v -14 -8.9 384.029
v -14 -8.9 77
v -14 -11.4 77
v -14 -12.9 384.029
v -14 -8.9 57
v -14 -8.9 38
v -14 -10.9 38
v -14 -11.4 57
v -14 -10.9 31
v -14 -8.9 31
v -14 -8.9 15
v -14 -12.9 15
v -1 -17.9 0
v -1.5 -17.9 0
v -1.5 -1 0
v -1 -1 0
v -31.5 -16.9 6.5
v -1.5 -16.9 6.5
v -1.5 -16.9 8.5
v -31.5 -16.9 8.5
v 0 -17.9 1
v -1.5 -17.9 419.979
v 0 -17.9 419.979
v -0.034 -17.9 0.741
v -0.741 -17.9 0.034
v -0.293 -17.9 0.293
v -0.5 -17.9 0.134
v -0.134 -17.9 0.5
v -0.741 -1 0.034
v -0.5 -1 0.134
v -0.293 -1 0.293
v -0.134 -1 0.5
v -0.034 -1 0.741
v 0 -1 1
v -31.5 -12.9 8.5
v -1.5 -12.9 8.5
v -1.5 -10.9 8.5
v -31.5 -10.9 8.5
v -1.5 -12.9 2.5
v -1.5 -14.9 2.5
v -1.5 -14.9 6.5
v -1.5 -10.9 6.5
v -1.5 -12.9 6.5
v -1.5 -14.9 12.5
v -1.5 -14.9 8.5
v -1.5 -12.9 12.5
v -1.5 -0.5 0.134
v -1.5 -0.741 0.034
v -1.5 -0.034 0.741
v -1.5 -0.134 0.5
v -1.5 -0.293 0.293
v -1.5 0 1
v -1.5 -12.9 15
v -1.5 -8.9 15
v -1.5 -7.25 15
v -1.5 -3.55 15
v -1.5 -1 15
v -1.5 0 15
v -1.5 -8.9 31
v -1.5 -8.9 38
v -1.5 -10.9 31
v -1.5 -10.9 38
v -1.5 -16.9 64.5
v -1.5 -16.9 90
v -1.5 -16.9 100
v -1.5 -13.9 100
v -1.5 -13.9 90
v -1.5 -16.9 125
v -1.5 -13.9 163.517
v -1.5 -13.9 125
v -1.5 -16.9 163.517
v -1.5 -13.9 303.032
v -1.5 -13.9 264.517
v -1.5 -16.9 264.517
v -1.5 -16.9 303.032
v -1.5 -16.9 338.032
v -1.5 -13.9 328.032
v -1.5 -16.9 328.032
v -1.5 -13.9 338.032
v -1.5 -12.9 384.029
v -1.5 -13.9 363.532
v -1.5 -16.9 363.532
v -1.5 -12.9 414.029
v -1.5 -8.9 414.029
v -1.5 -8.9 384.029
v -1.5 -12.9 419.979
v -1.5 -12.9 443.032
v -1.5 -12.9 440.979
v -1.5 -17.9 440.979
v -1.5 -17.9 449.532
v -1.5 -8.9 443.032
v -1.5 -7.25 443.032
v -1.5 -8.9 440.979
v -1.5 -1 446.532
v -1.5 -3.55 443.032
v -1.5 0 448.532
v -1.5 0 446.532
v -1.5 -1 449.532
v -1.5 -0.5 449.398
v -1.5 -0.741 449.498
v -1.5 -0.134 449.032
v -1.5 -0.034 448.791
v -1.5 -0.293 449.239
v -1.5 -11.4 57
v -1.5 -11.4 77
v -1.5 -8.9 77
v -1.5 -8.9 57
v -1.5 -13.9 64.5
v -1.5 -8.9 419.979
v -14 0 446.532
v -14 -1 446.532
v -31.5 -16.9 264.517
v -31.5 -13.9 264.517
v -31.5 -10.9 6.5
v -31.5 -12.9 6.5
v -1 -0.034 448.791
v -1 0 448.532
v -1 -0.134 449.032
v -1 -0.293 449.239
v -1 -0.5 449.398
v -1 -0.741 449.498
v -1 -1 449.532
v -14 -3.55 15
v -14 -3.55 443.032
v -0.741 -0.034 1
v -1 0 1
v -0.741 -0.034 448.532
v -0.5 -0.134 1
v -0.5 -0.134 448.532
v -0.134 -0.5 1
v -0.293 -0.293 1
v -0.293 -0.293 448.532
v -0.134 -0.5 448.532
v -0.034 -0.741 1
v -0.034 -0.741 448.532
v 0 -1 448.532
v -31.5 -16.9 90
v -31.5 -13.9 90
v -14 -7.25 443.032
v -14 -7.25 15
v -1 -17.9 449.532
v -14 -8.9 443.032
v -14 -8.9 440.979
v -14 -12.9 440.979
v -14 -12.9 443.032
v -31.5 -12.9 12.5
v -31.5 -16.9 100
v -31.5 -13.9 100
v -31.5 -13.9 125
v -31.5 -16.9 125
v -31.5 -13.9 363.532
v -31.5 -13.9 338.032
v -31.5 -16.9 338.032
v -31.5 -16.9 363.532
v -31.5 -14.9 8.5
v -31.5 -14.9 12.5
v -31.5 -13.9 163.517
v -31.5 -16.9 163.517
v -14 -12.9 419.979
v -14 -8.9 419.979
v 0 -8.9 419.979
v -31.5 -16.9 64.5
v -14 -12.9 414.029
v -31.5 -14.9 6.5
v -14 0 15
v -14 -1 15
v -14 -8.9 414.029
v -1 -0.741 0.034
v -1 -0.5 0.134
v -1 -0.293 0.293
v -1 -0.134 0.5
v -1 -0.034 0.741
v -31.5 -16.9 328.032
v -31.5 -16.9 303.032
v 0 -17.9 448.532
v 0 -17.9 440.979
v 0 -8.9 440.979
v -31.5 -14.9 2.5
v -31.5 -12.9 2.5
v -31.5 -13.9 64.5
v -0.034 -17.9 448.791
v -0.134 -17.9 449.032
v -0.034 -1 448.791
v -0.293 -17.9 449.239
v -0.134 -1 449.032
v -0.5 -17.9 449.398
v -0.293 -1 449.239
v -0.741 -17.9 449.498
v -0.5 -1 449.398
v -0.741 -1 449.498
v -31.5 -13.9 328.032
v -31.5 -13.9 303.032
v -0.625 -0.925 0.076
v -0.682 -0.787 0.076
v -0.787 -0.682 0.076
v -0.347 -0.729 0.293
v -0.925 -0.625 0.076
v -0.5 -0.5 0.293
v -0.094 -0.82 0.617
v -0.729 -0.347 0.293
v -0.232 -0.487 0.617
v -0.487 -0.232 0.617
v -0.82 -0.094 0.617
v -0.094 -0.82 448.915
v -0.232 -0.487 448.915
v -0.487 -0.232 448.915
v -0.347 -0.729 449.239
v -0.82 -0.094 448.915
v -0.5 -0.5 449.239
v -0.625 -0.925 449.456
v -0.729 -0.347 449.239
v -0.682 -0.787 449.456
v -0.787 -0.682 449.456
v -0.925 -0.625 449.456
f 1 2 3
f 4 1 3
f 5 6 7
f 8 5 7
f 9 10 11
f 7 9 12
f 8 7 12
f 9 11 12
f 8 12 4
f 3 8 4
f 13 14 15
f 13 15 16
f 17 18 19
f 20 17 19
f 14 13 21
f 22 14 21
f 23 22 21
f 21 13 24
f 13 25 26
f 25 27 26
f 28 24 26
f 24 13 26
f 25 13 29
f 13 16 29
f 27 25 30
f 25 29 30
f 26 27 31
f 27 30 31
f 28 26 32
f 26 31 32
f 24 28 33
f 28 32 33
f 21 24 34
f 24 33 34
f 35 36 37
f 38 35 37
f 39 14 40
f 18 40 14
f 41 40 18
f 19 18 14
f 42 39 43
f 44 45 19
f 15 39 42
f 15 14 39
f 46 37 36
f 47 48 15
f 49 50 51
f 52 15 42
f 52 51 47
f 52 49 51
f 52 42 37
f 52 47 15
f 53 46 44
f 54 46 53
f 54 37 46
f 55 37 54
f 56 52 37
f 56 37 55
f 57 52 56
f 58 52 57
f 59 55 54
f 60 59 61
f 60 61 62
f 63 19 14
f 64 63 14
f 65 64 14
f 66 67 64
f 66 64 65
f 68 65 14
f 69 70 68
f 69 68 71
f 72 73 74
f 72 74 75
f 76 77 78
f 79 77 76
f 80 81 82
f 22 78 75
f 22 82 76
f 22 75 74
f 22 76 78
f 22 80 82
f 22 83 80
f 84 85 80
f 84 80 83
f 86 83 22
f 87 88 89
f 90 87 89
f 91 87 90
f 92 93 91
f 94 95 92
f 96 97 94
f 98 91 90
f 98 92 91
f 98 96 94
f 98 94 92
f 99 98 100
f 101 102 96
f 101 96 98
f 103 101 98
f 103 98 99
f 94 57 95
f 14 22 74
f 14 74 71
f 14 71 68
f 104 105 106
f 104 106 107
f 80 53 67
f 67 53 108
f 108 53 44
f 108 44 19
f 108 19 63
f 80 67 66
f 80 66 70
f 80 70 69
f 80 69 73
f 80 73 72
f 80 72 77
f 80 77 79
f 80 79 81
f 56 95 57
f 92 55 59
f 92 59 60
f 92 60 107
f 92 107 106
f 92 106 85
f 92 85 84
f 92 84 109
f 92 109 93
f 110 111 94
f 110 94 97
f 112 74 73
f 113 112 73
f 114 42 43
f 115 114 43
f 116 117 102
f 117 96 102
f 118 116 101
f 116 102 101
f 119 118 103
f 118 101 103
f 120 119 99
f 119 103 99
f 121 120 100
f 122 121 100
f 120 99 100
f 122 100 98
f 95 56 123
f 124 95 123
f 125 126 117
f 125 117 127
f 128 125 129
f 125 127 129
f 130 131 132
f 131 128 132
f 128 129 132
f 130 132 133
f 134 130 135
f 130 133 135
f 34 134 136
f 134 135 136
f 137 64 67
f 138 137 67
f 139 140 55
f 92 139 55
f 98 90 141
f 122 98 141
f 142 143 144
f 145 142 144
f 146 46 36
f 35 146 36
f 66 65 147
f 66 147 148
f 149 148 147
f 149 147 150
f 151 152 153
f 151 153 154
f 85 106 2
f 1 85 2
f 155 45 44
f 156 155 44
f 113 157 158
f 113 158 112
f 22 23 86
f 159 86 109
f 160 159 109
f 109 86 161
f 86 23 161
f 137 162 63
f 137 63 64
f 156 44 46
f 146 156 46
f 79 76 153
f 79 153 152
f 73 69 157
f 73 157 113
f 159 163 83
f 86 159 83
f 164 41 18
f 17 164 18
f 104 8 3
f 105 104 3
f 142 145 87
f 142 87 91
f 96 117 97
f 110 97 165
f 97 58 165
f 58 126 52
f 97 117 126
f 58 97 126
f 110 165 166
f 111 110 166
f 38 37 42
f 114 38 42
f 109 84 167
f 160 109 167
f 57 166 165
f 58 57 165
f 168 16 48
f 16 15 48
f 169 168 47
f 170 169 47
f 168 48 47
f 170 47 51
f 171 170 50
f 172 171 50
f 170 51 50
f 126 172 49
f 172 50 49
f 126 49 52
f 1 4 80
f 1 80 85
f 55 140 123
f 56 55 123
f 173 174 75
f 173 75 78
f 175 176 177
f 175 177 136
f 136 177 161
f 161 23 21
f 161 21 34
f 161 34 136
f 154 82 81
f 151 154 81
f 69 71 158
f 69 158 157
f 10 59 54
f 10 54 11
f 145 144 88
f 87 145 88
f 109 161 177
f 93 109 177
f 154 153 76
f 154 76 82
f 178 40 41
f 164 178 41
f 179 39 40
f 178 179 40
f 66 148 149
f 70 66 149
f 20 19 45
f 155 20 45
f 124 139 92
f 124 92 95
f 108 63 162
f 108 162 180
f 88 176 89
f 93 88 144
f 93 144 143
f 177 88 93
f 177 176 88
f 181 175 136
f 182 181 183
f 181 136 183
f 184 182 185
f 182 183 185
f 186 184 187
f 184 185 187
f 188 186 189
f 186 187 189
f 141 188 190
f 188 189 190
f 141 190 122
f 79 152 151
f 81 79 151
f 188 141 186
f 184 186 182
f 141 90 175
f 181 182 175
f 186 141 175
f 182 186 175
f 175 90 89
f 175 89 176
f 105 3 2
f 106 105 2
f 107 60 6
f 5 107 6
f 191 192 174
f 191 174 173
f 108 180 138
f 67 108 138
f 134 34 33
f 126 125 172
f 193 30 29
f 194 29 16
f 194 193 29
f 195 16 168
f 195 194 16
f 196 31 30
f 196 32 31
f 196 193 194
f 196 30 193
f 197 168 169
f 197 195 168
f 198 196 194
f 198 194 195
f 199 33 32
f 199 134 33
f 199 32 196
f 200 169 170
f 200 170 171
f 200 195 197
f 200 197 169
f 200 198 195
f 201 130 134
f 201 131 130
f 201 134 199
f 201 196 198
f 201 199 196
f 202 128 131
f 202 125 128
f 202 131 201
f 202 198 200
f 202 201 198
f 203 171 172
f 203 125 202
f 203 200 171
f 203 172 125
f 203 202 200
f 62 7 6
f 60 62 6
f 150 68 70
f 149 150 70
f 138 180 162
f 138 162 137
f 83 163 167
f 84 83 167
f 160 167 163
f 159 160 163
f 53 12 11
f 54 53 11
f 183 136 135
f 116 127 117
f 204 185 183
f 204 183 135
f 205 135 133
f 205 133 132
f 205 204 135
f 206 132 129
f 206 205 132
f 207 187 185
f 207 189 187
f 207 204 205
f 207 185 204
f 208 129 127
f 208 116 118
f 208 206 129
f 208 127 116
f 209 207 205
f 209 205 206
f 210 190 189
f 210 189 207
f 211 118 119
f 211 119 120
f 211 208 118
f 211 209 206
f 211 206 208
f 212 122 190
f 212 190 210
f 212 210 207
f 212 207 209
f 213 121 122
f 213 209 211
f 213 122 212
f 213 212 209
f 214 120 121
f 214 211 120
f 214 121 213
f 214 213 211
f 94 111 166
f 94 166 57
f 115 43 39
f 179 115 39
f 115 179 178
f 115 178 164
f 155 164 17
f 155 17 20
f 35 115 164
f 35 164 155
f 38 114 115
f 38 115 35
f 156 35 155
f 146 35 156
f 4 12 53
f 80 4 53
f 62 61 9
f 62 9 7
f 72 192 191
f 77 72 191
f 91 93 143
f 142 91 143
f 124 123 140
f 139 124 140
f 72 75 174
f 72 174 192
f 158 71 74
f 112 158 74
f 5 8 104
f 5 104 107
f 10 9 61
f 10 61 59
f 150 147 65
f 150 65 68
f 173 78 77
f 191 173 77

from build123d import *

# Parameters (mm, degrees)
EXTRUDE_1_DEPTH          = 449.532
SKETCH_7_W               = 15
SKETCH_7_H               = 12.9
CUT_EXTRUDE_2_DEPTH      = 12.5
CUT_EXTRUDE_3_DEPTH      = 12.5
SKETCH_10_W              = 25.5
SKETCH_10_H              = 3
SKETCH_10_W_2            = 101
SKETCH_10_W_3            = 25
EXTRUDE_6_DEPTH          = 30
CUT_EXTRUDE_4_DEPTH      = 30
CUT_EXTRUDE_4_DEPTH_BACK = 30
SKETCH_11_W              = 21
SKETCH_11_H              = 9
SKETCH_12_W              = 30
SKETCH_12_H              = 4
CUT_EXTRUDE_5_DEPTH      = 12.5
SKETCH_15_W              = 7
SKETCH_15_H              = 2
CUT_EXTRUDE_8_DEPTH      = 12.5
SKETCH_17_W              = 20
SKETCH_17_H              = 2.5
CUT_EXTRUDE_9_DEPTH      = 12.5
FILLET_2_R               = 1
FILLET_3_R               = 1
FILLET_4_R               = 1


with BuildPart() as part:
    # 草图1 → 凸台-拉伸1 (new body)
    with BuildSketch(Plane.XY):
        Polygon((0, 0), (-14, 0), (-14, -1), (-1.5, -1), (-1.5, -3.55), (-14, -3.55), (-14, -7.25), (-1.5, -7.25), (-1.5, -8.9), (-14, -8.9), (-14, -12.9), (-1.5, -12.9), (-1.5, -17.9), (0, -17.9), align=None)
    extrude(amount=EXTRUDE_1_DEPTH)

    # 草图7 → 切除-拉伸2 (cut)
    with BuildSketch(Plane.ZY.offset(14)):
        with Locations((7.5, -6.45)):
            Rectangle(SKETCH_7_W, SKETCH_7_H)
    extrude(amount=-CUT_EXTRUDE_2_DEPTH, mode=Mode.SUBTRACT)

    # 草图8 → 切除-拉伸3 (cut)
    with BuildSketch(Plane.ZY.offset(14)):
        Polygon((449.532, -12.9), (443.032, -12.9), (443.032, -1), (446.532, -1.000447275), (446.532, 0), (449.532, 0), align=None)
    extrude(amount=-CUT_EXTRUDE_3_DEPTH, mode=Mode.SUBTRACT)

    # 草图10 → 凸台-拉伸6 (add)
    with BuildSketch(Plane.ZY.offset(1.5)):
        Polygon((6.5, -14.9), (6.5, -16.9), (8.5, -16.9), (8.5, -14.9), (12.5, -14.9), (12.5, -12.9), (8.5, -12.9), (8.5, -10.9), (6.5, -10.9), (6.5, -12.9), (2.5, -12.9), (2.5, -14.9), align=None)
        with Locations((77.25, -15.4)):
            Rectangle(SKETCH_10_W, SKETCH_10_H)
        with Locations((214.017, -15.4)):
            Rectangle(SKETCH_10_W_2, SKETCH_10_H)
        with Locations((112.5, -15.4)):
            Rectangle(SKETCH_10_W_3, SKETCH_10_H)
        with Locations((315.532, -15.4)):
            Rectangle(SKETCH_10_W_3, SKETCH_10_H)
        with Locations((350.782, -15.4)):
            Rectangle(SKETCH_10_W, SKETCH_10_H)
    extrude(amount=EXTRUDE_6_DEPTH)

    # 草图11 → 切除-拉伸4 (cut, two sides: drawn at the far end of the back side and taken through both)
    with BuildSketch(Plane.ZY.offset(1.5).offset(-CUT_EXTRUDE_4_DEPTH_BACK)):
        with Locations((430.4789, -13.4)):
            Rectangle(SKETCH_11_W, SKETCH_11_H)
    extrude(amount=CUT_EXTRUDE_4_DEPTH + CUT_EXTRUDE_4_DEPTH_BACK, mode=Mode.SUBTRACT)

    # 草图12 → 切除-拉伸5 (cut)
    with BuildSketch(Plane.ZY.offset(14)):
        with Locations((399.0289, -10.9)):
            Rectangle(SKETCH_12_W, SKETCH_12_H)
    extrude(amount=-CUT_EXTRUDE_5_DEPTH, mode=Mode.SUBTRACT)

    # 草图15 → 切除-拉伸8 (cut)
    with BuildSketch(Plane.ZY.offset(14)):
        with Locations((34.5, -9.9)):
            Rectangle(SKETCH_15_W, SKETCH_15_H)
    extrude(amount=-CUT_EXTRUDE_8_DEPTH, mode=Mode.SUBTRACT)

    # 草图17 → 切除-拉伸9 (cut)
    with BuildSketch(Plane.ZY.offset(14)):
        with Locations((67, -10.15)):
            Rectangle(SKETCH_17_W, SKETCH_17_H)
    extrude(amount=-CUT_EXTRUDE_9_DEPTH, mode=Mode.SUBTRACT)

    # 圆角2
    fillet_2_edges = [part.edges().sort_by_distance(p)[0] for p in [
        (0, 0, 224.766),
    ]]
    fillet(fillet_2_edges, radius=FILLET_2_R)

    # 圆角3
    fillet_3_edges = [part.edges().sort_by_distance(p)[0] for p in [
        (0, -9.45, 0),
        (-1.25, 0, 0),
        (-0.292893219, -0.292893219, 0),
    ]]
    fillet(fillet_3_edges, radius=FILLET_3_R)

    # 圆角4
    fillet_4_edges = [part.edges().sort_by_distance(p)[0] for p in [
        (-1.25, 0, 449.532),
        (-0.292893219, -0.292893219, 449.532),
        (0, -9.45, 449.532),
    ]]
    fillet(fillet_4_edges, radius=FILLET_4_R)


solid = part.part
